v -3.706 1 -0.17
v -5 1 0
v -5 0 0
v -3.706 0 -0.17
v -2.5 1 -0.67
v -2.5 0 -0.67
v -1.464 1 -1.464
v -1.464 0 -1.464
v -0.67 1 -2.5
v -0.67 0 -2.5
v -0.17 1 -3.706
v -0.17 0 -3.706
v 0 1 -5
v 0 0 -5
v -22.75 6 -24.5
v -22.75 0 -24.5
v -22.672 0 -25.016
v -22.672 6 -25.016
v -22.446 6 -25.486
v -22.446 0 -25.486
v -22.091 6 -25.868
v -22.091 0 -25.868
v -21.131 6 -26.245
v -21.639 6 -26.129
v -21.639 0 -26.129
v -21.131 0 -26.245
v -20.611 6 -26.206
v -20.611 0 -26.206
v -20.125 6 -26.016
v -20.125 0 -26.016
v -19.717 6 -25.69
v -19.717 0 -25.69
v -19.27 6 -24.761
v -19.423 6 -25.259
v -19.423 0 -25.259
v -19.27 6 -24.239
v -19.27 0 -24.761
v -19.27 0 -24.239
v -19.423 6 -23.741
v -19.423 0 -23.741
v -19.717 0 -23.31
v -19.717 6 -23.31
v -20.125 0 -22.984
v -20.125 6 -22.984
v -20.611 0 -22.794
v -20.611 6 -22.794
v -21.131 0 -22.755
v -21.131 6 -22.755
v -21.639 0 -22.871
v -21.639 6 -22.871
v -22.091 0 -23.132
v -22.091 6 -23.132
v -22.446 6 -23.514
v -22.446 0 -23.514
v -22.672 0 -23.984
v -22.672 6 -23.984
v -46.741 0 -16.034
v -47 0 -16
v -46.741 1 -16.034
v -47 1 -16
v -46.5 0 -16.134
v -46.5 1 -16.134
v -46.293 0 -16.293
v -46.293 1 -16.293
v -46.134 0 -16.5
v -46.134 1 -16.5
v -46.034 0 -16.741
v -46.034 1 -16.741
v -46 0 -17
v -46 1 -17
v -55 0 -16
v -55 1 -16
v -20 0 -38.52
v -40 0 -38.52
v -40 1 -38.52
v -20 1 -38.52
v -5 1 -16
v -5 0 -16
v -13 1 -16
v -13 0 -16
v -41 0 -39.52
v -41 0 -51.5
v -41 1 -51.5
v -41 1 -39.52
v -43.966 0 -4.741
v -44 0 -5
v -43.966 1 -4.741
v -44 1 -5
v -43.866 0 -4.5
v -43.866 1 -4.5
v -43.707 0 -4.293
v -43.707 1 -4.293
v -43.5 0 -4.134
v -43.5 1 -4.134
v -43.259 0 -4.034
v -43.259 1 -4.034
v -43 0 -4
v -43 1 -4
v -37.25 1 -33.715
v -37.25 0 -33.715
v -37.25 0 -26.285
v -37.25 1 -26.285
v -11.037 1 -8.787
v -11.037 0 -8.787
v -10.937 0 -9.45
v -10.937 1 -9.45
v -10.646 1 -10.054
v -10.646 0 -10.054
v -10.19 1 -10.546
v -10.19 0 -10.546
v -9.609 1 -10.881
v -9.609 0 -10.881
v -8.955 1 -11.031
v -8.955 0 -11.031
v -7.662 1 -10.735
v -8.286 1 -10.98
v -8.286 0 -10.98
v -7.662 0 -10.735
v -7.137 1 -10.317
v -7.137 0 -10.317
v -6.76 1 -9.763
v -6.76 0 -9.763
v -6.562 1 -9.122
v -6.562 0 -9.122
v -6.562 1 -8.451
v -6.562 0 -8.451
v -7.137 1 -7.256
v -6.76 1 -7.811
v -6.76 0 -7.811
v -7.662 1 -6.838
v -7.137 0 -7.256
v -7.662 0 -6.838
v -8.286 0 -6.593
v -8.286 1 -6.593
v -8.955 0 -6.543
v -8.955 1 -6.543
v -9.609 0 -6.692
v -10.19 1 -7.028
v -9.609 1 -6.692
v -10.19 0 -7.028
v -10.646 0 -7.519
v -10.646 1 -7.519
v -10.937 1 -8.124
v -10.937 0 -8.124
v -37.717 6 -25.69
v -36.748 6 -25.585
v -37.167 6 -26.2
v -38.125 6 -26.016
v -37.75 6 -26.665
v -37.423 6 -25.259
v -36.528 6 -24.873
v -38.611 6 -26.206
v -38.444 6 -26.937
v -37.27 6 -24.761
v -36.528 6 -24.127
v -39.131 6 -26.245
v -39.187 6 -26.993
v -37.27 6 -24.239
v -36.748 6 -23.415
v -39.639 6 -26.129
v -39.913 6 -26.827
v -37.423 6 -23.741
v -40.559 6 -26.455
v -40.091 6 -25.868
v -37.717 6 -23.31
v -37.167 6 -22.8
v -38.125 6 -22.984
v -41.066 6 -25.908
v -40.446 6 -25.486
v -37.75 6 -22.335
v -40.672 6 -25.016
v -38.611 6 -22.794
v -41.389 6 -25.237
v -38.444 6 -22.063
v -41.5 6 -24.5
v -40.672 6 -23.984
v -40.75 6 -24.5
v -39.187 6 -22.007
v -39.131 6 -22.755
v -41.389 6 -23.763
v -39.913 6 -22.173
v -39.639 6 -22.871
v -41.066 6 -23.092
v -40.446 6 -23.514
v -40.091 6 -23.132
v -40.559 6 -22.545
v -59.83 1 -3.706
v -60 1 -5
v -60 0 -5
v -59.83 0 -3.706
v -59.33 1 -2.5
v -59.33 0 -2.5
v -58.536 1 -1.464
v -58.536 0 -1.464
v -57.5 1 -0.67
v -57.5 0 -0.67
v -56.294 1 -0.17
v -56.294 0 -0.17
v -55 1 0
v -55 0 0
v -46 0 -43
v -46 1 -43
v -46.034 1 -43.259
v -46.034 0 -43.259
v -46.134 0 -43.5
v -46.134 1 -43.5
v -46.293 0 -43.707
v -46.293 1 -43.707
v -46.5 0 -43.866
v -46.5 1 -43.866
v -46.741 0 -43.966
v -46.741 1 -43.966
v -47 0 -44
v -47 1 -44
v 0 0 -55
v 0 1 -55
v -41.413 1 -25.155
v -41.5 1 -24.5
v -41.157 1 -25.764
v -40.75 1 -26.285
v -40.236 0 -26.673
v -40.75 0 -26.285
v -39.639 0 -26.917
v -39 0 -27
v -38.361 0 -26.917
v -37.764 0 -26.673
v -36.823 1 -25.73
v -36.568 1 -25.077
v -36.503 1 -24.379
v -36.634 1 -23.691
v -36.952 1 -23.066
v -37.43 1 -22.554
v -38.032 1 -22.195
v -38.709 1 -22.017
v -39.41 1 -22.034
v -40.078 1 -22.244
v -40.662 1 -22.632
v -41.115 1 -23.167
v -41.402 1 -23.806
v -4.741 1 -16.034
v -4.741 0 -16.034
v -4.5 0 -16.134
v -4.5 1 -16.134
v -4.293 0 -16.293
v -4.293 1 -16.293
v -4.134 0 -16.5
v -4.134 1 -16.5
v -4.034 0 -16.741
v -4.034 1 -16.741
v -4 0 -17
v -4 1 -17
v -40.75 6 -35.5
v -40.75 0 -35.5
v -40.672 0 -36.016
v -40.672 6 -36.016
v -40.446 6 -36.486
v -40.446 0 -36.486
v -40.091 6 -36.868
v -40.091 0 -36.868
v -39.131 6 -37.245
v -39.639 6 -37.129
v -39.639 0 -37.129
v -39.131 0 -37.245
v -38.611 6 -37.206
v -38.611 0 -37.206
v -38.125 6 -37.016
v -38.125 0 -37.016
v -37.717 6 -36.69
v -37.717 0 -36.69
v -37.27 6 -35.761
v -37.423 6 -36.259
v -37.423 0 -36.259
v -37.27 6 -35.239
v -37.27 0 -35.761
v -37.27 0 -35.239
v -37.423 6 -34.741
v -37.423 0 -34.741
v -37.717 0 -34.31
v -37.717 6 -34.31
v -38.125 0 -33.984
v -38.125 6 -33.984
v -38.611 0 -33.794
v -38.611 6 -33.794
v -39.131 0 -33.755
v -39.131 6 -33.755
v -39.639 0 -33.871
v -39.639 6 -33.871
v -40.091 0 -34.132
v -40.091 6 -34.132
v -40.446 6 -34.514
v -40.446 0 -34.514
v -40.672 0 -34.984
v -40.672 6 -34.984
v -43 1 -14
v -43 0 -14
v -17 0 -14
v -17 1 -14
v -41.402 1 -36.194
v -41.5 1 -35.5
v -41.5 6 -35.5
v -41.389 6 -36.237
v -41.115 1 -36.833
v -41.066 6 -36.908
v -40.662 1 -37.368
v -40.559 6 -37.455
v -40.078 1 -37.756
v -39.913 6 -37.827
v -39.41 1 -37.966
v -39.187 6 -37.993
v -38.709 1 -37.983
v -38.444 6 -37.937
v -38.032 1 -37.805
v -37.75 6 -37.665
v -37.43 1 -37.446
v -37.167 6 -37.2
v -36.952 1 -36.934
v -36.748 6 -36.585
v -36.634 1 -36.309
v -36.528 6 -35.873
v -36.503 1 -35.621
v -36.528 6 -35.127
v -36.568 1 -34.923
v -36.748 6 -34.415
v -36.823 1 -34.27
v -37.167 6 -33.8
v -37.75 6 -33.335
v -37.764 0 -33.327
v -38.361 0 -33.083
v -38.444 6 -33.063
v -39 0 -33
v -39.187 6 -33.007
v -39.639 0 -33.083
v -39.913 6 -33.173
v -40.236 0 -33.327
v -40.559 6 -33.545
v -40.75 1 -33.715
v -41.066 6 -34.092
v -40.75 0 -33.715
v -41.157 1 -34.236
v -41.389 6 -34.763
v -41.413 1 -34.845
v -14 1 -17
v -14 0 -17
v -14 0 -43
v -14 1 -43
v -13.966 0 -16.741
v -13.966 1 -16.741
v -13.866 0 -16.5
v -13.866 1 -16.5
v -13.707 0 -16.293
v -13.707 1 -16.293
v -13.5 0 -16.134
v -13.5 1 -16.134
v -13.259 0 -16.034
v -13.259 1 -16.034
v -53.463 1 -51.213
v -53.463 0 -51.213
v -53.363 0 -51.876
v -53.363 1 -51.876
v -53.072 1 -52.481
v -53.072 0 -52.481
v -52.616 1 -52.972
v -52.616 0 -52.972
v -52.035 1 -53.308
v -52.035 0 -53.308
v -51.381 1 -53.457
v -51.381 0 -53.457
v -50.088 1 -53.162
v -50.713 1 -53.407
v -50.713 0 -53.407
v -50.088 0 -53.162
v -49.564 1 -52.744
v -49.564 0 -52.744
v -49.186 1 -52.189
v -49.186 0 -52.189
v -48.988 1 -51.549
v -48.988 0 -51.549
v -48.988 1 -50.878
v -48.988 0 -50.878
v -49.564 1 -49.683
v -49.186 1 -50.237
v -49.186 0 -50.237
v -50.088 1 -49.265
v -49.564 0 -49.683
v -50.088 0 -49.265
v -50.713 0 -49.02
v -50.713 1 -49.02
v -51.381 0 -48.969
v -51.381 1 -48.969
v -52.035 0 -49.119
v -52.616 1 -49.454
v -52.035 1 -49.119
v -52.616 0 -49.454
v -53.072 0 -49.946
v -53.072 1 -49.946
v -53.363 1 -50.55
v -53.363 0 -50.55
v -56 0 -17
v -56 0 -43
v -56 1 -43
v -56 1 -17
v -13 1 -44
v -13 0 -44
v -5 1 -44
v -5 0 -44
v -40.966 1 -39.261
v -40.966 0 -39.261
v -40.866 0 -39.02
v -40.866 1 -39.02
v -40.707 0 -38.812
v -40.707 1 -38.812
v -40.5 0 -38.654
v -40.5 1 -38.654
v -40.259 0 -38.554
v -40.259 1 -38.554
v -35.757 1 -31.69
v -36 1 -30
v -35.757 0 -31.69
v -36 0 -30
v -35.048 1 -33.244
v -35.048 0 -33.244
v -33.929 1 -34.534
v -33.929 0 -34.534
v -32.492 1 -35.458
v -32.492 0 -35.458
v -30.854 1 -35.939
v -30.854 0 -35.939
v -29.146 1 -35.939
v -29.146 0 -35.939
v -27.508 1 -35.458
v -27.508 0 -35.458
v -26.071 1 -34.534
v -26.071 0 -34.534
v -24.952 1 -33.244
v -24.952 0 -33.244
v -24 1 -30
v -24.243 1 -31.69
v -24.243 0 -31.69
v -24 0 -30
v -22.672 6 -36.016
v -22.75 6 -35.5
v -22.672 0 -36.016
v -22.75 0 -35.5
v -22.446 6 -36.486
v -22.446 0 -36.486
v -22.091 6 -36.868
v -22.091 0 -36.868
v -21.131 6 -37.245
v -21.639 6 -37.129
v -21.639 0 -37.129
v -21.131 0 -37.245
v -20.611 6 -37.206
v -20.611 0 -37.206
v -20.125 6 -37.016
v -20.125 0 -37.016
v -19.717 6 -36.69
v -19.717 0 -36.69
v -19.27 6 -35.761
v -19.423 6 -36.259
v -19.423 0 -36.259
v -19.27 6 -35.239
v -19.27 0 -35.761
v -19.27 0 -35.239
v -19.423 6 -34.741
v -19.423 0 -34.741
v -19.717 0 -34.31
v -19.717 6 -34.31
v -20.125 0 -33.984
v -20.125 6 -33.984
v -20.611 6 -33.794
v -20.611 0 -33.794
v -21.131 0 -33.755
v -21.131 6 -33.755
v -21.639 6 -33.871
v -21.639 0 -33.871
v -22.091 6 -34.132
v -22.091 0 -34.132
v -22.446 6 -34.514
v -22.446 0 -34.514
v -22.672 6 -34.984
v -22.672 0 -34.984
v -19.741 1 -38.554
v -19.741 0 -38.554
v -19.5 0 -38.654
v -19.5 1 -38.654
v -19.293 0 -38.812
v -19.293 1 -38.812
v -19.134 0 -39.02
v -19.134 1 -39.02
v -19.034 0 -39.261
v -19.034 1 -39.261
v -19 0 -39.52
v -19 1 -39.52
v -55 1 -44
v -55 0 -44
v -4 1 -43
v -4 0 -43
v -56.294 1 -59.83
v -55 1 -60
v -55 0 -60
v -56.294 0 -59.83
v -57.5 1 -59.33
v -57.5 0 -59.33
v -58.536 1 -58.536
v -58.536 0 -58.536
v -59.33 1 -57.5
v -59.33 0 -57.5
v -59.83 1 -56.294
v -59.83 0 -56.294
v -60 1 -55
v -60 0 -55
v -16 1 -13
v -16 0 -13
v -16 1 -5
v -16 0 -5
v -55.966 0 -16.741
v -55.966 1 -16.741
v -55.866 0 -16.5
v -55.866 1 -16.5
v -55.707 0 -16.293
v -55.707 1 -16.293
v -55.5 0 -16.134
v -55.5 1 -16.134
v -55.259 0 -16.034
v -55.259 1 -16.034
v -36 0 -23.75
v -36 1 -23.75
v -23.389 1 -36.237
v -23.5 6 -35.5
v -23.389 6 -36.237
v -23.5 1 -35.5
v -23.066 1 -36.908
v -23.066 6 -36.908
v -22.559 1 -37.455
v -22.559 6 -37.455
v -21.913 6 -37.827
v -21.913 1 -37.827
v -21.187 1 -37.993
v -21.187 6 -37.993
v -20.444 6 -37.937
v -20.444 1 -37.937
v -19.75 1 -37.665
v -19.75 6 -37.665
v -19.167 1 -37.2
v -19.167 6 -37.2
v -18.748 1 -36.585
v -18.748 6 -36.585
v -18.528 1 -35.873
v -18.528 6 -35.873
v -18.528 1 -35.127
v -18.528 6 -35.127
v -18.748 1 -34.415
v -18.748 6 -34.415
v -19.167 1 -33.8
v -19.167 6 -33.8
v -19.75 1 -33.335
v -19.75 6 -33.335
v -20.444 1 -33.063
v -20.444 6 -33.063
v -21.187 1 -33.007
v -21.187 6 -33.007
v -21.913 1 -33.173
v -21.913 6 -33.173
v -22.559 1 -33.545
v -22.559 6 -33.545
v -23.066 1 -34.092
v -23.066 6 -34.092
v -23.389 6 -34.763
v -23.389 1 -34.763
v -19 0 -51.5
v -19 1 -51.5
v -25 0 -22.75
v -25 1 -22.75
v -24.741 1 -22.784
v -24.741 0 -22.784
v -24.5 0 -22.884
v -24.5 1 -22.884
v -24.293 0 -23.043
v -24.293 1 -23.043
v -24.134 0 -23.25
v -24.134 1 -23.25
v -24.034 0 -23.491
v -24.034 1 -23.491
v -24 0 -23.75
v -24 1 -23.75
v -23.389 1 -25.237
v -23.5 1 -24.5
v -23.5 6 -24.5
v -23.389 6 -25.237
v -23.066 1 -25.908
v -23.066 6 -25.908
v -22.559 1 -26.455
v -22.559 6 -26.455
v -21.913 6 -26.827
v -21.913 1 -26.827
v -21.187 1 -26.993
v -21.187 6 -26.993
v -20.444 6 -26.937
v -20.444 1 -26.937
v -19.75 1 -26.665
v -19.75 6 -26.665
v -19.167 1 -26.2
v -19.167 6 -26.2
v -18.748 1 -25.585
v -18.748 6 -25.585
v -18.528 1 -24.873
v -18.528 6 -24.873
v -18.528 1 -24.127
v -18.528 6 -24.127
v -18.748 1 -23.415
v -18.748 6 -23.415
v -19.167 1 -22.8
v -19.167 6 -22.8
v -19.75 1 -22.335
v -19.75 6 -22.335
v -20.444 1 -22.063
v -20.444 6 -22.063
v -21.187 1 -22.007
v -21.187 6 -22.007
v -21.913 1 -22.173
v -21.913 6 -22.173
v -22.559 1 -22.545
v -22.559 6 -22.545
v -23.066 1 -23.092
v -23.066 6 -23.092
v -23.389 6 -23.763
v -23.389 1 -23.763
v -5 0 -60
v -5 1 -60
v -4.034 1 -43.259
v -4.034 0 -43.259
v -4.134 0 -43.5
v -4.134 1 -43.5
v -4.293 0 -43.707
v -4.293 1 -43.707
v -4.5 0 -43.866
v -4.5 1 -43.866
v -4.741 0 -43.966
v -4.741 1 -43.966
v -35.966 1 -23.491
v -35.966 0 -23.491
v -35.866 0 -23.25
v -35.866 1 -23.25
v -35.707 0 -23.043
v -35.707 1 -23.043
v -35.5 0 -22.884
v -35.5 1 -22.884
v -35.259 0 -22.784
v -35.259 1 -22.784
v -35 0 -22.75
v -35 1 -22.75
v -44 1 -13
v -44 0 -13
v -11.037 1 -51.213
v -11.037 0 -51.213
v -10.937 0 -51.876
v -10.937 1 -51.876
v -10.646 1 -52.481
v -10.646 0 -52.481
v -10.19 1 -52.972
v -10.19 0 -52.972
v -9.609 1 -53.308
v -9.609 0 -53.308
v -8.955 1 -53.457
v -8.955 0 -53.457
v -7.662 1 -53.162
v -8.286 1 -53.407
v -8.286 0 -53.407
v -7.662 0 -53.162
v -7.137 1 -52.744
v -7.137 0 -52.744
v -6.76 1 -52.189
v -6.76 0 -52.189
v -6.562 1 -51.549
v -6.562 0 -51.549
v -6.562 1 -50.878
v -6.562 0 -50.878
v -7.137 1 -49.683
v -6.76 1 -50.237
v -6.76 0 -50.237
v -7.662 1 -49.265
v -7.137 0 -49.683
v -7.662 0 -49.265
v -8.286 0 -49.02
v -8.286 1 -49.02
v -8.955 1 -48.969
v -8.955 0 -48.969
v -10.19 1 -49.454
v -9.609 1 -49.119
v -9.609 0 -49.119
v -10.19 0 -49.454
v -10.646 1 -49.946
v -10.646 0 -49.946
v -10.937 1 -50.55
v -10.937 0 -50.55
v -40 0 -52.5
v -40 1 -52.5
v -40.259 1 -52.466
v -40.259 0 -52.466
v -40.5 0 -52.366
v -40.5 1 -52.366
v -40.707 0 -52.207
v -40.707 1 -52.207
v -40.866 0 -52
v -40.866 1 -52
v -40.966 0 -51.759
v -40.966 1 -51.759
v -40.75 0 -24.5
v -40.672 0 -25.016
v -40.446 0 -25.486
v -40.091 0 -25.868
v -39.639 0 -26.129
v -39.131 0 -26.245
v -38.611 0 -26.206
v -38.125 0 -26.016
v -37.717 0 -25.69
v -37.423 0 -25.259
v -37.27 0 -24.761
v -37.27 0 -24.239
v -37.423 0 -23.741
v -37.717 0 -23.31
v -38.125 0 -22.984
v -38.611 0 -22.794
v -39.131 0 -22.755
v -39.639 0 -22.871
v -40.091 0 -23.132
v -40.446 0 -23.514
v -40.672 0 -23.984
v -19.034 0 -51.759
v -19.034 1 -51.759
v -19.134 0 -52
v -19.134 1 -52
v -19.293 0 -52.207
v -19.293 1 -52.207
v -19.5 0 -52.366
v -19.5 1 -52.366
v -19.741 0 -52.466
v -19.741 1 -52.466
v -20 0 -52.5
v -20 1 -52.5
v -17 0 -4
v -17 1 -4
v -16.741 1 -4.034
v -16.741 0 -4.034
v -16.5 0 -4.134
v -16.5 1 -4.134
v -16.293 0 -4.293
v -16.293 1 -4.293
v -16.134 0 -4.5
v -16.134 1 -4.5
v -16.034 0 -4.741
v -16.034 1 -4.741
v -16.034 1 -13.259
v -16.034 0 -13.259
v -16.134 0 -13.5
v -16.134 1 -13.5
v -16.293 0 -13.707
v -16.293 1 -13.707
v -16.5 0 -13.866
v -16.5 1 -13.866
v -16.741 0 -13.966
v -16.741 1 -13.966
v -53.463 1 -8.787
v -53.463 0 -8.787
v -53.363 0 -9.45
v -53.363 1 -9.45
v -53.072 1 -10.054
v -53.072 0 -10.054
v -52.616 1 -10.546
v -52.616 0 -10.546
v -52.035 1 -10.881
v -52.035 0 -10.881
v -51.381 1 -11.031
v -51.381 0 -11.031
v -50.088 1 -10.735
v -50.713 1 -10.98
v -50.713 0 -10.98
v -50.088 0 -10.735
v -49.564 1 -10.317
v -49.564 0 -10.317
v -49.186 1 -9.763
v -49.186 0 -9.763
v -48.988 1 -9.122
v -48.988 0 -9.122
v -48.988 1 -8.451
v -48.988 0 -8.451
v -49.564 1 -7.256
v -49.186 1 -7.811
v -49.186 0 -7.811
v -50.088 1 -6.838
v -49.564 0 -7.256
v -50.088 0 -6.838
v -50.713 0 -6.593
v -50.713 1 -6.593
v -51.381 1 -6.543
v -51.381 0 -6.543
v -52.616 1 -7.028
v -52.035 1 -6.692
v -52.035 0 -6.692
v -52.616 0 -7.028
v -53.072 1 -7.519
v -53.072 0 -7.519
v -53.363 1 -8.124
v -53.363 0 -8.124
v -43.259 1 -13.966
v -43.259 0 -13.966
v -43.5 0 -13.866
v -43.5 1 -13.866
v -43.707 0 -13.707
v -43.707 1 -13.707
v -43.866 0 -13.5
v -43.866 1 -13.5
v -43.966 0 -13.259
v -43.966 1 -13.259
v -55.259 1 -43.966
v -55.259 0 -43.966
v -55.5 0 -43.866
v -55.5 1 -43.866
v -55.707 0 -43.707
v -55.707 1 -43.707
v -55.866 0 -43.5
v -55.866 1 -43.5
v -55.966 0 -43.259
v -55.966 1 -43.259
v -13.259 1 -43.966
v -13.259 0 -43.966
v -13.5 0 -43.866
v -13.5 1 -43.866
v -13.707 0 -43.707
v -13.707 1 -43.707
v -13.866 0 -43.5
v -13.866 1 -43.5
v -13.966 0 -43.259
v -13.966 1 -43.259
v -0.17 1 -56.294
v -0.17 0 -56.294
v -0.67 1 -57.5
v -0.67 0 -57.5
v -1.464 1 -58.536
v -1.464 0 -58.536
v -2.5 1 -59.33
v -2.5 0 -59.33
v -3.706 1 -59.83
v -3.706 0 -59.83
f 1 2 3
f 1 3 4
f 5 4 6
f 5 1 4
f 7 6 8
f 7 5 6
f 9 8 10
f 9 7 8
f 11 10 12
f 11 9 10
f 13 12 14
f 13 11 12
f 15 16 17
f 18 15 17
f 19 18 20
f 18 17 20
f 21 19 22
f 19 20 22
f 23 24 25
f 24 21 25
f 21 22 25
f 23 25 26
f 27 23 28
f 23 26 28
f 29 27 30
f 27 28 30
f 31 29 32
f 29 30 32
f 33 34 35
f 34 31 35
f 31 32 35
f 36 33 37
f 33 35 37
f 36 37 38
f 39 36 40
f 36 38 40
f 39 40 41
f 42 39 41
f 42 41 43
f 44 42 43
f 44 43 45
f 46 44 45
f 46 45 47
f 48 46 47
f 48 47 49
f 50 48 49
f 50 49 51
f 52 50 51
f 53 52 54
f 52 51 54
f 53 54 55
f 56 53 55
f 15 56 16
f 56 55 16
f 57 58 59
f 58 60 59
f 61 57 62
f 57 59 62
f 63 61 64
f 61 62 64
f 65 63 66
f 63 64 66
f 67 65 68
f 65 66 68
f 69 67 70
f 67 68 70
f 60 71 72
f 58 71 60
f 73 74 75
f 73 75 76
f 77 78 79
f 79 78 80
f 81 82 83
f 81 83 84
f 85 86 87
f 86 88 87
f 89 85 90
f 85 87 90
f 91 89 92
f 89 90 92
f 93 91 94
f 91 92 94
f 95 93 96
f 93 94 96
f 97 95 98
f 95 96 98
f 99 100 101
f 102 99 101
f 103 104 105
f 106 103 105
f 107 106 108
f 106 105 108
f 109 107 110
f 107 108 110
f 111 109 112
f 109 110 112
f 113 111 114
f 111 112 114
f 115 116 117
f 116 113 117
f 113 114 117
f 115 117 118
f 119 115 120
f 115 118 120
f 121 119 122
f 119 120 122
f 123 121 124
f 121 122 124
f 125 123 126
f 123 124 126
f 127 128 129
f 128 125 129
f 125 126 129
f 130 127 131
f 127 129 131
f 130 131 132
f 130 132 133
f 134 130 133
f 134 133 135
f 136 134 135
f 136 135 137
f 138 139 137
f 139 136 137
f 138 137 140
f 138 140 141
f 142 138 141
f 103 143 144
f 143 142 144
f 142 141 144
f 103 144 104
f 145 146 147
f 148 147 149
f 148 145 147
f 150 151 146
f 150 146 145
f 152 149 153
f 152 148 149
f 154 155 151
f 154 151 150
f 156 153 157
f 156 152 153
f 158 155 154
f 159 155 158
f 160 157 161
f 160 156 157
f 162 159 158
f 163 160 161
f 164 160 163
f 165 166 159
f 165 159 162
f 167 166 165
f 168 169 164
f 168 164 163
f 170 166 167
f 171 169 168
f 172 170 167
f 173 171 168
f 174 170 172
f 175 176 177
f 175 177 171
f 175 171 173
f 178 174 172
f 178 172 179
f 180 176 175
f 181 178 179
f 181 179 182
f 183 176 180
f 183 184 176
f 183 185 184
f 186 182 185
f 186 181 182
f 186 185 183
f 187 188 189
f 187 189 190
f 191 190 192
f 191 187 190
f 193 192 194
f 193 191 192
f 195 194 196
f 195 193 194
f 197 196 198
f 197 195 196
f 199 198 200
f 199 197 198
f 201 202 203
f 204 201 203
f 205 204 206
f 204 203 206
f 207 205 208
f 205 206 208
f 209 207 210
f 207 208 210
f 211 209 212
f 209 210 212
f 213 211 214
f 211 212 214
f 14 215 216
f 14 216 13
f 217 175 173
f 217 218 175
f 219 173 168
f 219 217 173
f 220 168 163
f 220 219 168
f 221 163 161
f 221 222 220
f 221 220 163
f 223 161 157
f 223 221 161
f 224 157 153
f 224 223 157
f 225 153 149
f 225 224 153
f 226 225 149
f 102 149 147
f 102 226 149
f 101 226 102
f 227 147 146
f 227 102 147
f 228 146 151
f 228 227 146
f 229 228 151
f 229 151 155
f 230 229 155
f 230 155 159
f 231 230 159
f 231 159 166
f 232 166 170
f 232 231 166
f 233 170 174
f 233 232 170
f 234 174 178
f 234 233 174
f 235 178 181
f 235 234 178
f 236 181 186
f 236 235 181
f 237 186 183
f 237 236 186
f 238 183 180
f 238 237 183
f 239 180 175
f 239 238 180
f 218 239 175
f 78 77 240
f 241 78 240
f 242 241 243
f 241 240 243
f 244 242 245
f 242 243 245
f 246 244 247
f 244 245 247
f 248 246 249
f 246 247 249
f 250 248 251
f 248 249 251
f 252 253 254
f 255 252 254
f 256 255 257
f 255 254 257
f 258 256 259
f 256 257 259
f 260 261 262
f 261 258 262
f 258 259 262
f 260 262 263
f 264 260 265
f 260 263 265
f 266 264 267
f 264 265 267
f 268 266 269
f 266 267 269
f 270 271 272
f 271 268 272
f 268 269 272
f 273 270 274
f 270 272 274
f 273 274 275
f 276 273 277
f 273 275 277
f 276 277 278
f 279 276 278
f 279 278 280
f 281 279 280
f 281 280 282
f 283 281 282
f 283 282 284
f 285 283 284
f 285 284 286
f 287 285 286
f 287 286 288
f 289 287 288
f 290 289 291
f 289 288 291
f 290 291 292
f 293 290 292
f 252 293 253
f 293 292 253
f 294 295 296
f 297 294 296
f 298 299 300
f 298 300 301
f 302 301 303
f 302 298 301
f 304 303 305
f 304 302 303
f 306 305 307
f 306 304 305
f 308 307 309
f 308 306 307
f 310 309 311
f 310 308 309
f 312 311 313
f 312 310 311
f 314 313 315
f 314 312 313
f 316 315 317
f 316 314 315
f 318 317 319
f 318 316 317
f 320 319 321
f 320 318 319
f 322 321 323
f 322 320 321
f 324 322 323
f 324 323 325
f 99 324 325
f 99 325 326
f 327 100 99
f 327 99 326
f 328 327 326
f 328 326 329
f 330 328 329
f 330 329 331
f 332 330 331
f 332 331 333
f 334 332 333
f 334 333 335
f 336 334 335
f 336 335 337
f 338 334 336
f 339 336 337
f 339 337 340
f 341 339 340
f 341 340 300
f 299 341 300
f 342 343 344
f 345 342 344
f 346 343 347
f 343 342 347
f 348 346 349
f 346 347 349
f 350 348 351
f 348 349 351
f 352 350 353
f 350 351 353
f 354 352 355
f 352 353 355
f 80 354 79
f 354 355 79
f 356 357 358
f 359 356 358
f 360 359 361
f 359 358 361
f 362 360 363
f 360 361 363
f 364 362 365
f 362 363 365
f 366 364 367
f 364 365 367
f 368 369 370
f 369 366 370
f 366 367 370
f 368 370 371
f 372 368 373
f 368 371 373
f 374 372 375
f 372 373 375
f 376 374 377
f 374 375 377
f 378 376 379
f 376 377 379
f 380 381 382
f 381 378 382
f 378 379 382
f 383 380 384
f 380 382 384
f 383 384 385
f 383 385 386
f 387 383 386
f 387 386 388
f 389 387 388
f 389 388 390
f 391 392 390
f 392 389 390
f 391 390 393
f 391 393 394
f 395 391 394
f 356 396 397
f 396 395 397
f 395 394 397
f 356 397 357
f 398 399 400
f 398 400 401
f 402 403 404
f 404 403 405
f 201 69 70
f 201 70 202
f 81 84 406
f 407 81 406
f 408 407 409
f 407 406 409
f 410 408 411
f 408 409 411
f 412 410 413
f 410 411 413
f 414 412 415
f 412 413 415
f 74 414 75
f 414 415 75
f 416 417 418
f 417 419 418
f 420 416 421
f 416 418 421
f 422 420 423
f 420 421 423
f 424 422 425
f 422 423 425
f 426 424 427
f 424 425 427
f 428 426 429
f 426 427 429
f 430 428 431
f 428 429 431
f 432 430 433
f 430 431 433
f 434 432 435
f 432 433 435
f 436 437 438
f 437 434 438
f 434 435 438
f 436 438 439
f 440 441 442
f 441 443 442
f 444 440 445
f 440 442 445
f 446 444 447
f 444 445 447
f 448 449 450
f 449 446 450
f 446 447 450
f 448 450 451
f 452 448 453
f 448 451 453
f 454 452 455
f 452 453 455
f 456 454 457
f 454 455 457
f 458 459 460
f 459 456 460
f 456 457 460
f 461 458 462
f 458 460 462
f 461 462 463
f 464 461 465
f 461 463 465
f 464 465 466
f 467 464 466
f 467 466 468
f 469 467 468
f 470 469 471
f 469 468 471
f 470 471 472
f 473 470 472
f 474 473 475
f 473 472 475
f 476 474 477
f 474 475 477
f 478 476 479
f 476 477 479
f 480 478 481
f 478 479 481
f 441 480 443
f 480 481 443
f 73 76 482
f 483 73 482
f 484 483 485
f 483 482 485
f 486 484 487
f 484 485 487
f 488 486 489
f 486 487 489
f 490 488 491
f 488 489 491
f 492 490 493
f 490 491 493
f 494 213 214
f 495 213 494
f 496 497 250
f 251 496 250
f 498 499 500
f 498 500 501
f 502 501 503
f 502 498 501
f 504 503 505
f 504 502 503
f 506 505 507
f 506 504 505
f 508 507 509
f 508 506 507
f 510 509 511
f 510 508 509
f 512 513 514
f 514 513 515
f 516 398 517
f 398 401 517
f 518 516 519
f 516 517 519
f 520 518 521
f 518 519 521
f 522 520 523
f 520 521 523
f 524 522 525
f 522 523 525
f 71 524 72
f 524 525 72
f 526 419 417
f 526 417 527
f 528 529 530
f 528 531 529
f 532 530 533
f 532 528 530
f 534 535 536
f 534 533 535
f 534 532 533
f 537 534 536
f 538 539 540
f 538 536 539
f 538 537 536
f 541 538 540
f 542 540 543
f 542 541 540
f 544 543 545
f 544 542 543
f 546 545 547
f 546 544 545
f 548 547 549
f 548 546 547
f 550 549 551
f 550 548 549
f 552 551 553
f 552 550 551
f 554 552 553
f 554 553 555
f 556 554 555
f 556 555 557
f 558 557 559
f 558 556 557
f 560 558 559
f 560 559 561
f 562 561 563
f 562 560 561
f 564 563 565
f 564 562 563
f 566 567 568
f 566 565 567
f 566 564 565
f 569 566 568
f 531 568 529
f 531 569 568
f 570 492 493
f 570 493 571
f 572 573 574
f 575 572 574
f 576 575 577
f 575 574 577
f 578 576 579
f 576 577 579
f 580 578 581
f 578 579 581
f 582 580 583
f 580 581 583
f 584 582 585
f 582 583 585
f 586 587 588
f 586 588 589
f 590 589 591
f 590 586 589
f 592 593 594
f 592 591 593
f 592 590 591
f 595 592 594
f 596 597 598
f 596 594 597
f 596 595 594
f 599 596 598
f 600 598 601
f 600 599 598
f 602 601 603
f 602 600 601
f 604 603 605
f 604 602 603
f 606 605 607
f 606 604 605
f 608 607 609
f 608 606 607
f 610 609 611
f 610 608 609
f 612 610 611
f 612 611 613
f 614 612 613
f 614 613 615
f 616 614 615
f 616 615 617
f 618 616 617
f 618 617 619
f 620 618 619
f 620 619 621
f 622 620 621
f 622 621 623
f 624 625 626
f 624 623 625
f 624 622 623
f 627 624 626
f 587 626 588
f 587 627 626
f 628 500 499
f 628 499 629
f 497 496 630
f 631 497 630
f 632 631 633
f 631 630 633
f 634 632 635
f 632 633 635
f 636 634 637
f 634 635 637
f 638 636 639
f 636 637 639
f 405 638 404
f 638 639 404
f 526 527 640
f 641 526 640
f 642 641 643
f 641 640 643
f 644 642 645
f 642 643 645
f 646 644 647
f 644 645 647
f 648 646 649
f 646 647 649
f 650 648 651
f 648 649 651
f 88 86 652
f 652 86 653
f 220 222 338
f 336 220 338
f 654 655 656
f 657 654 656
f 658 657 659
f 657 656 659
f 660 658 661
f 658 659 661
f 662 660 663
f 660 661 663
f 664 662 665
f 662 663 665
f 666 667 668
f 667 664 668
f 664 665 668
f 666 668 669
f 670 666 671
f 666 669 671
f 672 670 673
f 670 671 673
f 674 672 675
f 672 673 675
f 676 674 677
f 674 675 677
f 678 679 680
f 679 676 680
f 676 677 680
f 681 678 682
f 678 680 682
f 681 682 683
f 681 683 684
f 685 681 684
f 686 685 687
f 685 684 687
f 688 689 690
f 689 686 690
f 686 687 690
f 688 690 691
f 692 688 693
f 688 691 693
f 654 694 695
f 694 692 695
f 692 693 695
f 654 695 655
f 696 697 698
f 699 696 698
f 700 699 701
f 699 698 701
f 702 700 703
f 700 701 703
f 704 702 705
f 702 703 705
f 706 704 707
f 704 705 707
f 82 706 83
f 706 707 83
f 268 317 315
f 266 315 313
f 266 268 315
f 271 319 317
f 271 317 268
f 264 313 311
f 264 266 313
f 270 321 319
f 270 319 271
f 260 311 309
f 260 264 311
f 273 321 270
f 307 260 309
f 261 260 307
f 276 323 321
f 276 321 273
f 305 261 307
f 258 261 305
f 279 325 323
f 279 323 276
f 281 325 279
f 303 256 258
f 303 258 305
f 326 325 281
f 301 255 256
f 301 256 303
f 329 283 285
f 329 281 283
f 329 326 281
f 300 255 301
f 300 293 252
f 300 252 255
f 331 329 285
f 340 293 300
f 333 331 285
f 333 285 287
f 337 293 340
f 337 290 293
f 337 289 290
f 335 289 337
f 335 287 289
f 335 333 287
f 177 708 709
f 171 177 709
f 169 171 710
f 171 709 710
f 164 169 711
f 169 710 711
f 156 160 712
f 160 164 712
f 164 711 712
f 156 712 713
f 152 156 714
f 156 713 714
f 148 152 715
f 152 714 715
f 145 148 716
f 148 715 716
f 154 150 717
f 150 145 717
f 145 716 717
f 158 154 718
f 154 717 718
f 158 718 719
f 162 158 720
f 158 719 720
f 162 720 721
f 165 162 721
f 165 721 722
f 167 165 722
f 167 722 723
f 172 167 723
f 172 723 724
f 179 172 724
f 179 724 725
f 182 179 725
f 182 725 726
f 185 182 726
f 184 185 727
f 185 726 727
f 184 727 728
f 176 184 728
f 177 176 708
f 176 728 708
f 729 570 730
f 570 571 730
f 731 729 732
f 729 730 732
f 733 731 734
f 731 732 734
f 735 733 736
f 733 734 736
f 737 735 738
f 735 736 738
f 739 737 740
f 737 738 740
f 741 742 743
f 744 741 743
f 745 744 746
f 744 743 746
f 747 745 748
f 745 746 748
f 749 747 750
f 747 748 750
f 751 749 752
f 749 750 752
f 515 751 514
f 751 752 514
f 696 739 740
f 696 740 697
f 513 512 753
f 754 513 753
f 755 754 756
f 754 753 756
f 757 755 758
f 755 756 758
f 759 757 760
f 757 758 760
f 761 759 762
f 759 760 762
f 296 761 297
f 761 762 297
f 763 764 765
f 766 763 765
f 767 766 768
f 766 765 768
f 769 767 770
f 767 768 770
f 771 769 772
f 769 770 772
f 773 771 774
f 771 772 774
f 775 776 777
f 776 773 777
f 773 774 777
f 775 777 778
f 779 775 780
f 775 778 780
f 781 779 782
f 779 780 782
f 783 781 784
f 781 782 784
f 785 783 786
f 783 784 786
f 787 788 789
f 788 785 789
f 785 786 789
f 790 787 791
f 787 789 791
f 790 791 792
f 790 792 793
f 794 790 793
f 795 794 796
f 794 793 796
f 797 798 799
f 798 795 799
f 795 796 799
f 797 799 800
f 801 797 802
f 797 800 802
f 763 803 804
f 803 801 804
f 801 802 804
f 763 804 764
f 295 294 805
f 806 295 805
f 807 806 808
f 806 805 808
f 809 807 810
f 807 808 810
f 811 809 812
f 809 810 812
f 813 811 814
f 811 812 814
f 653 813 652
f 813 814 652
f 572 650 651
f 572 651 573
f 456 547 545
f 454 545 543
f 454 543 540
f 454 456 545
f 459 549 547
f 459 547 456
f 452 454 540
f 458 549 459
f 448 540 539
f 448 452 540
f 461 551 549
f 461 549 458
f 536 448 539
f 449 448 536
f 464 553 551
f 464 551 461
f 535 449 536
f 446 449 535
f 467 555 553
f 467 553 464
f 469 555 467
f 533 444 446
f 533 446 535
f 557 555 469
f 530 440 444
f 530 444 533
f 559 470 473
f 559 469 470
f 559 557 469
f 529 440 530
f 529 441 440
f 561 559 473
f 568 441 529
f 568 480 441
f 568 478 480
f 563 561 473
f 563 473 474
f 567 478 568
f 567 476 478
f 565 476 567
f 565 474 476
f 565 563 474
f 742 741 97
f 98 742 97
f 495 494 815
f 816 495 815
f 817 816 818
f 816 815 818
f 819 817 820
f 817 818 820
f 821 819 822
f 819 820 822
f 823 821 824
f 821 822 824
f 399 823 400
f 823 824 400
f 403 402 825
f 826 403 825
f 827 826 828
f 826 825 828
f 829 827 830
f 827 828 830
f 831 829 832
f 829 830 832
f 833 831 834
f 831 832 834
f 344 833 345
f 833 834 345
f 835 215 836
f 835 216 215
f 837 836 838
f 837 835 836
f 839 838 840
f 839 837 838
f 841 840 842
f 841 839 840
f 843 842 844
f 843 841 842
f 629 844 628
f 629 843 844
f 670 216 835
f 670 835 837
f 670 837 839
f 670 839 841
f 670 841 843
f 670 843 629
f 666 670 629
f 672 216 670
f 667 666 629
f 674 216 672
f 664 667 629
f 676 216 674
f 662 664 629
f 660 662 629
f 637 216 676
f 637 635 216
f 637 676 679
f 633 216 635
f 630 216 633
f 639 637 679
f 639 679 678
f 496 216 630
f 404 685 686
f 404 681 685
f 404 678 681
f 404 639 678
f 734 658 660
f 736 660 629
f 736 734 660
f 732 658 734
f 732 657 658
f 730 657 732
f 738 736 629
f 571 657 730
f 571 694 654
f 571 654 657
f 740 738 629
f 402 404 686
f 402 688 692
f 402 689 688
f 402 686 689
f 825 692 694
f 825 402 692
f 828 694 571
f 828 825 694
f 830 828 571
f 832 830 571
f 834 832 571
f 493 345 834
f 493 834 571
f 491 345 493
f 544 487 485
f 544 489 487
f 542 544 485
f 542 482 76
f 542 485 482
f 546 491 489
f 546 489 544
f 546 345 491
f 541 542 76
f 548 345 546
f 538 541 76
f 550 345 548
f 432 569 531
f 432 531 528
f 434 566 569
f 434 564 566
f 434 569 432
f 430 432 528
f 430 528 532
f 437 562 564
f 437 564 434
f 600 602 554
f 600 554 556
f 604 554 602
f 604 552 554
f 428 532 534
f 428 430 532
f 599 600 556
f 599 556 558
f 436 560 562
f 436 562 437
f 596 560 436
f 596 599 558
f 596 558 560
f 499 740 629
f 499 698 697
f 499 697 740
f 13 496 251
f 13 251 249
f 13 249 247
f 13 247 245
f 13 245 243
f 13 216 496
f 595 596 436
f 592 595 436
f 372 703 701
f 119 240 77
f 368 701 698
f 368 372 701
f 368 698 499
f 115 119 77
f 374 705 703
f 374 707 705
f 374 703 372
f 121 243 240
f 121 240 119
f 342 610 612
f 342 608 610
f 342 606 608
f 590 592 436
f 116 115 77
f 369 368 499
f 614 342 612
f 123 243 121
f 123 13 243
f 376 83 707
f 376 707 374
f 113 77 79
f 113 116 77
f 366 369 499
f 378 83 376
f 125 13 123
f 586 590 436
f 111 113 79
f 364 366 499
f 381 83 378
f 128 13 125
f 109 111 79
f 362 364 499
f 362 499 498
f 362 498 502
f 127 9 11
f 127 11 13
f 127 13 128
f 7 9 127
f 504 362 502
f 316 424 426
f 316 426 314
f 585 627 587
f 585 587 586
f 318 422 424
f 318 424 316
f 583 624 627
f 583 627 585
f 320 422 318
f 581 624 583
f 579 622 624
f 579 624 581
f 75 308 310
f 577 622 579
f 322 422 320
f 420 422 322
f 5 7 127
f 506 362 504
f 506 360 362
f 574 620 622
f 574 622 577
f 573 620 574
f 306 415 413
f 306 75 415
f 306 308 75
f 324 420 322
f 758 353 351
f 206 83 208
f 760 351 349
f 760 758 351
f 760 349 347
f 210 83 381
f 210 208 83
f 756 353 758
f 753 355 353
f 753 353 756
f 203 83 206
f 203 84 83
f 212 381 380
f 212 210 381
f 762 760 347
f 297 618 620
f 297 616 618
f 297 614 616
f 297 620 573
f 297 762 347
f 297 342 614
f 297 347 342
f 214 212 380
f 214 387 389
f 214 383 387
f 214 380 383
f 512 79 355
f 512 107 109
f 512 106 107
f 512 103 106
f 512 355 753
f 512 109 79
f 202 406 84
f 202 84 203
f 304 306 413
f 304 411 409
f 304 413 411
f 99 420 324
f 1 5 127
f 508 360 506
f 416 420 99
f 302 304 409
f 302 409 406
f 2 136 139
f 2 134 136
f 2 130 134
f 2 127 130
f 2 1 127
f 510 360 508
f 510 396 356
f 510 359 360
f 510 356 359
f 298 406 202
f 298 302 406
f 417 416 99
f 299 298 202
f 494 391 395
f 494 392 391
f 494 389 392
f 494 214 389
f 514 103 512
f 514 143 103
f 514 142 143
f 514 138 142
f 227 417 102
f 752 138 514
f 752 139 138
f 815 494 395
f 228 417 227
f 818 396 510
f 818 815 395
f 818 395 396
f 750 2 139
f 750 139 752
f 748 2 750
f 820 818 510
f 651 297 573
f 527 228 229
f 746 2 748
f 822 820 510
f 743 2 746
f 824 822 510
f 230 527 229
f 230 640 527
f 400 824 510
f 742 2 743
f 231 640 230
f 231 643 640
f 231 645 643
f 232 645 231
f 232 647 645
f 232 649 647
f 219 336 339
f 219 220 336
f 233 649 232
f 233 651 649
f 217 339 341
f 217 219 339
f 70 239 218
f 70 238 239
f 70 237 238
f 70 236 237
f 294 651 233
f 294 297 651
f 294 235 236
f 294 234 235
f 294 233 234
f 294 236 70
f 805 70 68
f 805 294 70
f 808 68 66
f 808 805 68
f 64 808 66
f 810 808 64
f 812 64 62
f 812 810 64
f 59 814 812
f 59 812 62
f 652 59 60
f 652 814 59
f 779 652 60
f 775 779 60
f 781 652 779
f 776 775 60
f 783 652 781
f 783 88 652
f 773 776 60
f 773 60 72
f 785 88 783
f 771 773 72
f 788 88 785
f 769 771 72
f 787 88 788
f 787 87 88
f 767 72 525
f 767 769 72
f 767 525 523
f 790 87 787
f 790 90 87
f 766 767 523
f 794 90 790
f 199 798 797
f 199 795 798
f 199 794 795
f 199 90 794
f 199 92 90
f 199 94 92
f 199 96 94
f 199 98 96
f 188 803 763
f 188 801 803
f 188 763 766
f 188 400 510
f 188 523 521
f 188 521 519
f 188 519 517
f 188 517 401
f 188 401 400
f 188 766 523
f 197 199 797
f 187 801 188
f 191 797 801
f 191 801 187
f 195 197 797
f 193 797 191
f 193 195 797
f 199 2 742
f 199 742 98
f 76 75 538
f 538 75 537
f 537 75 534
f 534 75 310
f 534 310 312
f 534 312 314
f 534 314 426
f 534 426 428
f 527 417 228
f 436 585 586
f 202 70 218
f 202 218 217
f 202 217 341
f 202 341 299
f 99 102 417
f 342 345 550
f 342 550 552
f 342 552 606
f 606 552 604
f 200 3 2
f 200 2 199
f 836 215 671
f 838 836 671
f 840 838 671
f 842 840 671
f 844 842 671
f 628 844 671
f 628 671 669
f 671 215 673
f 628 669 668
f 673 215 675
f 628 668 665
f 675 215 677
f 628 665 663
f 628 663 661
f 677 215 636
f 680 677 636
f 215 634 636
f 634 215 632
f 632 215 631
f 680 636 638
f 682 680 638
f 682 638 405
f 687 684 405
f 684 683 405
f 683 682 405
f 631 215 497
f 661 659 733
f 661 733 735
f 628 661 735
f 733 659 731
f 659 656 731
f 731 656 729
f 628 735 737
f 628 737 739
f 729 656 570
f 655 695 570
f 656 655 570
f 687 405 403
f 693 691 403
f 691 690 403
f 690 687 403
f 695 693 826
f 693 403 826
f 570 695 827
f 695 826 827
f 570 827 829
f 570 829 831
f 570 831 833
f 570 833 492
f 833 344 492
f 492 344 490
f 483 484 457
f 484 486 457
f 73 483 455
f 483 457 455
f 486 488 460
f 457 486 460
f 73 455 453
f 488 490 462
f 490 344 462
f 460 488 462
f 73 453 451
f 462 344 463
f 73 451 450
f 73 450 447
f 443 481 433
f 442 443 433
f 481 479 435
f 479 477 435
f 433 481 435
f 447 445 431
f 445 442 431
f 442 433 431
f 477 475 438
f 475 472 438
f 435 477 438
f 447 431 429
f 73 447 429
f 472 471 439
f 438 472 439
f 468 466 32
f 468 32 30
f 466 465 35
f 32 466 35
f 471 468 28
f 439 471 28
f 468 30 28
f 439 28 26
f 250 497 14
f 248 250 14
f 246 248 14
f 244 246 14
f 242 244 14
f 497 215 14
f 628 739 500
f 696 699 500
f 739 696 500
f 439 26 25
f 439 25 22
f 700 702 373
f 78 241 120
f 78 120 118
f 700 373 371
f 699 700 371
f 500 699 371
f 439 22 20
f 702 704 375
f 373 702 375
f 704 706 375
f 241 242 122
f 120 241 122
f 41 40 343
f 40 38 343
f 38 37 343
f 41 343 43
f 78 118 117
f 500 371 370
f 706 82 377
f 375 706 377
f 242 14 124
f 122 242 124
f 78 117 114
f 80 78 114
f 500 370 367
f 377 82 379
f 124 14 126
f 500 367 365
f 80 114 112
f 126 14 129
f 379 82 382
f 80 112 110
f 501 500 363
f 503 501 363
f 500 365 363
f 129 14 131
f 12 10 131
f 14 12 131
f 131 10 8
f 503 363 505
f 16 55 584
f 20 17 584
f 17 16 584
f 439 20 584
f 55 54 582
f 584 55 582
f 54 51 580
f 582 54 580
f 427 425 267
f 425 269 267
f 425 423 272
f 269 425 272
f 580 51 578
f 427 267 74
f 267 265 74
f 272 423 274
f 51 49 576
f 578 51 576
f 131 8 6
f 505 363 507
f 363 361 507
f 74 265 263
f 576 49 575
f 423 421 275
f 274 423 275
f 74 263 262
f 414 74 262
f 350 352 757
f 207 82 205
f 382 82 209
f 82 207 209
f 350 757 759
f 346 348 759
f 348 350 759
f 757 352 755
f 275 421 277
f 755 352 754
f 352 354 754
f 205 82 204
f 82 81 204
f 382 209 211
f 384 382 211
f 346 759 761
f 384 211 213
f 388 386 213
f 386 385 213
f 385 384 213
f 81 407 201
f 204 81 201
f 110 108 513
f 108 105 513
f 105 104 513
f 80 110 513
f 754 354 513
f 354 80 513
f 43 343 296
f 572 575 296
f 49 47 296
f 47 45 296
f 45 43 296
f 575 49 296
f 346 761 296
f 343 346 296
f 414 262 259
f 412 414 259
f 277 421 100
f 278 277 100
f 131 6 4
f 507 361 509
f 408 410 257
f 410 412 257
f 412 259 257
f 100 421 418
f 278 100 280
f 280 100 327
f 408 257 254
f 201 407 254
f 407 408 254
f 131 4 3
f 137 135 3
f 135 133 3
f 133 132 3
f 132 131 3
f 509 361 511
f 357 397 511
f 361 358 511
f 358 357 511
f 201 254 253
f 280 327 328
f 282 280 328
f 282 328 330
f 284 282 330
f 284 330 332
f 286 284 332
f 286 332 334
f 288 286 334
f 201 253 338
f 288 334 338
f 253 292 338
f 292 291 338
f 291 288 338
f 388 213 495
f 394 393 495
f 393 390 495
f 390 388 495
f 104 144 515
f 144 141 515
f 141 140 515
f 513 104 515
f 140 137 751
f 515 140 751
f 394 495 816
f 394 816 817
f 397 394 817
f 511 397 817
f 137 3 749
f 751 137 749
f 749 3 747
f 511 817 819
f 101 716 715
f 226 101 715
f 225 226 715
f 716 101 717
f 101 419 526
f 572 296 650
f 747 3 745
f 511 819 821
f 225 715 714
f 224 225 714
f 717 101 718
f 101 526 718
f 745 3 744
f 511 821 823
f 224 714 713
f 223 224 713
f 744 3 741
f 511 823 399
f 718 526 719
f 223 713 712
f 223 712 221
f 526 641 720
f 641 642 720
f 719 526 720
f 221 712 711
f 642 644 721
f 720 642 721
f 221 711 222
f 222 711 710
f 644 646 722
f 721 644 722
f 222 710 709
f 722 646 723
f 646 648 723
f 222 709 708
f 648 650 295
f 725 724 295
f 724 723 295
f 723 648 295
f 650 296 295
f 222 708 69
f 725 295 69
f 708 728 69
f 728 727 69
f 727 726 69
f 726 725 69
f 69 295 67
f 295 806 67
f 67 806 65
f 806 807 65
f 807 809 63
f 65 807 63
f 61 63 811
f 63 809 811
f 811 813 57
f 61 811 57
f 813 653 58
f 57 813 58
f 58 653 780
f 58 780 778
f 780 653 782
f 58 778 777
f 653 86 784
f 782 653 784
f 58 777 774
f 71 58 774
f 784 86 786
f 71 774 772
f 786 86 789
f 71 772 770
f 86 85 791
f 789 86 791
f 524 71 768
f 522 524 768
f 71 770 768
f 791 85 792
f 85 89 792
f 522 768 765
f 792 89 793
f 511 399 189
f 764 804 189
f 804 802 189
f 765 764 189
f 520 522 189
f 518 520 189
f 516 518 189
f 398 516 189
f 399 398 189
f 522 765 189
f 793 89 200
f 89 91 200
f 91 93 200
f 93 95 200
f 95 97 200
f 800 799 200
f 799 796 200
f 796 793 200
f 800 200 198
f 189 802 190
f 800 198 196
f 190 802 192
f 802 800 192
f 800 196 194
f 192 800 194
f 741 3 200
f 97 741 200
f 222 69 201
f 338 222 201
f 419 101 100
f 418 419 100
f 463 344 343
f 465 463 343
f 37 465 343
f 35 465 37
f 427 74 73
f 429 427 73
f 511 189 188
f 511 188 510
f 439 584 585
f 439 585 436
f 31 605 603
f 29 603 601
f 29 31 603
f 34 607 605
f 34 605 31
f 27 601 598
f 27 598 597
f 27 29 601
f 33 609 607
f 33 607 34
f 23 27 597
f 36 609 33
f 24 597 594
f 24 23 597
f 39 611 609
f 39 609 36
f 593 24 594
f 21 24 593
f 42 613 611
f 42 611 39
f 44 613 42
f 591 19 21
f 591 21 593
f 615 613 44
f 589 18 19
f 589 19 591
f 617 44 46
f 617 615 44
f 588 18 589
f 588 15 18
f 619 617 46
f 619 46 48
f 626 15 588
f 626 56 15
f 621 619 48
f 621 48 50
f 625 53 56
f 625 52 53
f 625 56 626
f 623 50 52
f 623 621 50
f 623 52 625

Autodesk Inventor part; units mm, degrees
ref_plane "YZ Plane" through (0, 0, 0) normal (1, 0, 0) x (0, 1, 0)
ref_plane "XZ Plane" through (0, 0, 0) normal (0, 1, 0) x (-1, 0, 0)
ref_plane "XY Plane" through (0, 0, 0) normal (0, 0, 1) x (1, 0, 0)
sketch "Sketch1" plane through (0, 0, 0) normal (0, 1, 0) x (-1, 0, 0)
  line L0 (0, 0) -> (60, 0)
  line L1 (60, 0) -> (60, -60)
  line L2 (60, -60) -> (0, -60)
  line L3 (0, -60) -> (0, 0)
  circle A0 centre (51.2132, -8.7868) radius 2.25
  circle A1 centre (8.7868, -51.2132) radius 2.25
  circle A2 centre (8.7868, -8.7868) radius 2.25
  circle A3 centre (51.2132, -51.2132) radius 2.25
  line L4 (51.2132, -8.7868) -> (8.7868, -51.2132) construction
  line L5 (51.2132, -51.2132) -> (8.7868, -8.7868) construction
  line L6 (51.2132, -8.7868) -> (8.7868, -8.7868) construction
  line L7 (21, -24.5) -> (39, -24.5) construction
  line L8 (39, -24.5) -> (39, -35.5) construction
  line L9 (39, -35.5) -> (21, -35.5) construction
  line L10 (21, -35.5) -> (21, -24.5) construction
  line L11 (30, 0) -> (30, -60) construction
  circle A4 centre (21, -24.5) radius 1.75
  circle A5 centre (21, -35.5) radius 1.75
  line L12 (19, -22.5) -> (41, -22.5) construction
  line L13 (41, -22.5) -> (41, -52.5) construction
  line L14 (41, -52.5) -> (19, -52.5) construction
  line L15 (19, -52.5) -> (19, -22.5) construction
  line L16 (21, -24.5) -> (19, -24.5) construction
  line L17 (21, -24.5) -> (21, -22.5) construction
  line L18 (39, -24.5) -> (41, -24.5) construction
  circle A6 centre (39, -24.5) radius 1.75
  circle A7 centre (39, -35.5) radius 1.75
  arc A8 (24, -30) -> (36, -30) centre (30, -30) ccw
  line L19 (19, -52.5) -> (41, -52.5)
  line L20 (41, -52.5) -> (41, -38.5196)
  line L21 (41, -38.5196) -> (19, -38.5196)
  line L22 (19, -38.5196) -> (19, -52.5)
  circle A9 centre (21, -24.5) radius 2.5
  circle A10 centre (21, -35.5) radius 2.5
  circle A11 centre (39, -24.5) radius 2.5
  circle A12 centre (39, -35.5) radius 2.5
  line L23 (24, -30) -> (36, -30) construction
  line L24 (36, -30) -> (36, -22.75)
  line L25 (36, -22.75) -> (24, -22.75)
  line L26 (24, -22.75) -> (24, -30)
  line L27 (40.75, -26.2854) -> (40.75, -33.7146)
  line L28 (37.25, -33.7146) -> (37.25, -26.2854)
  line L29 (4, -16) -> (14, -16)
  line L30 (14, -16) -> (14, -44)
  line L31 (14, -44) -> (4, -44)
  line L32 (4, -44) -> (4, -16)
  line L33 (16, -4) -> (44, -4)
  line L34 (44, -4) -> (44, -14)
  line L35 (44, -14) -> (16, -14)
  line L36 (16, -14) -> (16, -4)
  line L37 (56, -16) -> (46, -16)
  line L38 (46, -16) -> (46, -44)
  line L39 (46, -44) -> (56, -44)
  line L40 (56, -44) -> (56, -16)
  point P0 (60, -30)
  point P1 (39, -30)
  point P2 (30, -24.5)
  dimension "d0" = 4.5
  dimension "d1" = 4.5
  dimension "d2" = 4.5
  dimension "d3" = 4.5
  dimension "d4" = 60
  dimension "d5" = 60
  dimension "d6" = 18
  dimension "d7" = 11
  dimension "d8" = 60
  dimension "d9" = 3.5
  dimension "d10" = 3.5
  dimension "d11" = 22
  dimension "d12" = 30
  dimension "d13" = 3.5
  dimension "d14" = 3.5
  dimension "d15" = 12
  dimension "d16" = 5
  dimension "d17" = 5
  dimension "d18" = 5
  dimension "d19" = 5
  dimension "d26" = 4
  dimension "d27" = 10
  dimension "d28" = 16
  dimension "d29" = 16
  dimension "d30" = 4
  dimension "d31" = 16
  dimension "d32" = 16
  dimension "d33" = 10
extrude "Extrusion1" add sketch "Sketch1" along normal blind 1 contours L0 L1 L2 L3
extrude "Extrusion2" add sketch "Sketch1" along normal blind 6 contours A9 | A10 | A11 | A12
fillet "Fillet1" radius 1 18 edges at (-41, 0.5, -52.5) (-41, 0.5, -38.5196) (-19, 0.5, -38.5196) (-19, 0.5, -52.5) (-36, 0.5, -22.75) (-24, 0.5, -22.75) (-44, 0.5, -4) (-44, 0.5, -14) (-56, 0.5, -44) (-56, 0.5, -16) (-46, 0.5, -44) (-46, 0.5, -16) (-16, 0.5, -4) (-16, 0.5, -14) (-4, 0.5, -44) (-4, 0.5, -16) (-14, 0.5, -16) (-14, 0.5, -44)
fillet "Fillet2" radius 5 4 edges at (0, 0.5, -60) (-60, 0.5, -60) (-60, 0.5, 0) (0, 0.5, 0)
properties part number "SensorMount_top"
